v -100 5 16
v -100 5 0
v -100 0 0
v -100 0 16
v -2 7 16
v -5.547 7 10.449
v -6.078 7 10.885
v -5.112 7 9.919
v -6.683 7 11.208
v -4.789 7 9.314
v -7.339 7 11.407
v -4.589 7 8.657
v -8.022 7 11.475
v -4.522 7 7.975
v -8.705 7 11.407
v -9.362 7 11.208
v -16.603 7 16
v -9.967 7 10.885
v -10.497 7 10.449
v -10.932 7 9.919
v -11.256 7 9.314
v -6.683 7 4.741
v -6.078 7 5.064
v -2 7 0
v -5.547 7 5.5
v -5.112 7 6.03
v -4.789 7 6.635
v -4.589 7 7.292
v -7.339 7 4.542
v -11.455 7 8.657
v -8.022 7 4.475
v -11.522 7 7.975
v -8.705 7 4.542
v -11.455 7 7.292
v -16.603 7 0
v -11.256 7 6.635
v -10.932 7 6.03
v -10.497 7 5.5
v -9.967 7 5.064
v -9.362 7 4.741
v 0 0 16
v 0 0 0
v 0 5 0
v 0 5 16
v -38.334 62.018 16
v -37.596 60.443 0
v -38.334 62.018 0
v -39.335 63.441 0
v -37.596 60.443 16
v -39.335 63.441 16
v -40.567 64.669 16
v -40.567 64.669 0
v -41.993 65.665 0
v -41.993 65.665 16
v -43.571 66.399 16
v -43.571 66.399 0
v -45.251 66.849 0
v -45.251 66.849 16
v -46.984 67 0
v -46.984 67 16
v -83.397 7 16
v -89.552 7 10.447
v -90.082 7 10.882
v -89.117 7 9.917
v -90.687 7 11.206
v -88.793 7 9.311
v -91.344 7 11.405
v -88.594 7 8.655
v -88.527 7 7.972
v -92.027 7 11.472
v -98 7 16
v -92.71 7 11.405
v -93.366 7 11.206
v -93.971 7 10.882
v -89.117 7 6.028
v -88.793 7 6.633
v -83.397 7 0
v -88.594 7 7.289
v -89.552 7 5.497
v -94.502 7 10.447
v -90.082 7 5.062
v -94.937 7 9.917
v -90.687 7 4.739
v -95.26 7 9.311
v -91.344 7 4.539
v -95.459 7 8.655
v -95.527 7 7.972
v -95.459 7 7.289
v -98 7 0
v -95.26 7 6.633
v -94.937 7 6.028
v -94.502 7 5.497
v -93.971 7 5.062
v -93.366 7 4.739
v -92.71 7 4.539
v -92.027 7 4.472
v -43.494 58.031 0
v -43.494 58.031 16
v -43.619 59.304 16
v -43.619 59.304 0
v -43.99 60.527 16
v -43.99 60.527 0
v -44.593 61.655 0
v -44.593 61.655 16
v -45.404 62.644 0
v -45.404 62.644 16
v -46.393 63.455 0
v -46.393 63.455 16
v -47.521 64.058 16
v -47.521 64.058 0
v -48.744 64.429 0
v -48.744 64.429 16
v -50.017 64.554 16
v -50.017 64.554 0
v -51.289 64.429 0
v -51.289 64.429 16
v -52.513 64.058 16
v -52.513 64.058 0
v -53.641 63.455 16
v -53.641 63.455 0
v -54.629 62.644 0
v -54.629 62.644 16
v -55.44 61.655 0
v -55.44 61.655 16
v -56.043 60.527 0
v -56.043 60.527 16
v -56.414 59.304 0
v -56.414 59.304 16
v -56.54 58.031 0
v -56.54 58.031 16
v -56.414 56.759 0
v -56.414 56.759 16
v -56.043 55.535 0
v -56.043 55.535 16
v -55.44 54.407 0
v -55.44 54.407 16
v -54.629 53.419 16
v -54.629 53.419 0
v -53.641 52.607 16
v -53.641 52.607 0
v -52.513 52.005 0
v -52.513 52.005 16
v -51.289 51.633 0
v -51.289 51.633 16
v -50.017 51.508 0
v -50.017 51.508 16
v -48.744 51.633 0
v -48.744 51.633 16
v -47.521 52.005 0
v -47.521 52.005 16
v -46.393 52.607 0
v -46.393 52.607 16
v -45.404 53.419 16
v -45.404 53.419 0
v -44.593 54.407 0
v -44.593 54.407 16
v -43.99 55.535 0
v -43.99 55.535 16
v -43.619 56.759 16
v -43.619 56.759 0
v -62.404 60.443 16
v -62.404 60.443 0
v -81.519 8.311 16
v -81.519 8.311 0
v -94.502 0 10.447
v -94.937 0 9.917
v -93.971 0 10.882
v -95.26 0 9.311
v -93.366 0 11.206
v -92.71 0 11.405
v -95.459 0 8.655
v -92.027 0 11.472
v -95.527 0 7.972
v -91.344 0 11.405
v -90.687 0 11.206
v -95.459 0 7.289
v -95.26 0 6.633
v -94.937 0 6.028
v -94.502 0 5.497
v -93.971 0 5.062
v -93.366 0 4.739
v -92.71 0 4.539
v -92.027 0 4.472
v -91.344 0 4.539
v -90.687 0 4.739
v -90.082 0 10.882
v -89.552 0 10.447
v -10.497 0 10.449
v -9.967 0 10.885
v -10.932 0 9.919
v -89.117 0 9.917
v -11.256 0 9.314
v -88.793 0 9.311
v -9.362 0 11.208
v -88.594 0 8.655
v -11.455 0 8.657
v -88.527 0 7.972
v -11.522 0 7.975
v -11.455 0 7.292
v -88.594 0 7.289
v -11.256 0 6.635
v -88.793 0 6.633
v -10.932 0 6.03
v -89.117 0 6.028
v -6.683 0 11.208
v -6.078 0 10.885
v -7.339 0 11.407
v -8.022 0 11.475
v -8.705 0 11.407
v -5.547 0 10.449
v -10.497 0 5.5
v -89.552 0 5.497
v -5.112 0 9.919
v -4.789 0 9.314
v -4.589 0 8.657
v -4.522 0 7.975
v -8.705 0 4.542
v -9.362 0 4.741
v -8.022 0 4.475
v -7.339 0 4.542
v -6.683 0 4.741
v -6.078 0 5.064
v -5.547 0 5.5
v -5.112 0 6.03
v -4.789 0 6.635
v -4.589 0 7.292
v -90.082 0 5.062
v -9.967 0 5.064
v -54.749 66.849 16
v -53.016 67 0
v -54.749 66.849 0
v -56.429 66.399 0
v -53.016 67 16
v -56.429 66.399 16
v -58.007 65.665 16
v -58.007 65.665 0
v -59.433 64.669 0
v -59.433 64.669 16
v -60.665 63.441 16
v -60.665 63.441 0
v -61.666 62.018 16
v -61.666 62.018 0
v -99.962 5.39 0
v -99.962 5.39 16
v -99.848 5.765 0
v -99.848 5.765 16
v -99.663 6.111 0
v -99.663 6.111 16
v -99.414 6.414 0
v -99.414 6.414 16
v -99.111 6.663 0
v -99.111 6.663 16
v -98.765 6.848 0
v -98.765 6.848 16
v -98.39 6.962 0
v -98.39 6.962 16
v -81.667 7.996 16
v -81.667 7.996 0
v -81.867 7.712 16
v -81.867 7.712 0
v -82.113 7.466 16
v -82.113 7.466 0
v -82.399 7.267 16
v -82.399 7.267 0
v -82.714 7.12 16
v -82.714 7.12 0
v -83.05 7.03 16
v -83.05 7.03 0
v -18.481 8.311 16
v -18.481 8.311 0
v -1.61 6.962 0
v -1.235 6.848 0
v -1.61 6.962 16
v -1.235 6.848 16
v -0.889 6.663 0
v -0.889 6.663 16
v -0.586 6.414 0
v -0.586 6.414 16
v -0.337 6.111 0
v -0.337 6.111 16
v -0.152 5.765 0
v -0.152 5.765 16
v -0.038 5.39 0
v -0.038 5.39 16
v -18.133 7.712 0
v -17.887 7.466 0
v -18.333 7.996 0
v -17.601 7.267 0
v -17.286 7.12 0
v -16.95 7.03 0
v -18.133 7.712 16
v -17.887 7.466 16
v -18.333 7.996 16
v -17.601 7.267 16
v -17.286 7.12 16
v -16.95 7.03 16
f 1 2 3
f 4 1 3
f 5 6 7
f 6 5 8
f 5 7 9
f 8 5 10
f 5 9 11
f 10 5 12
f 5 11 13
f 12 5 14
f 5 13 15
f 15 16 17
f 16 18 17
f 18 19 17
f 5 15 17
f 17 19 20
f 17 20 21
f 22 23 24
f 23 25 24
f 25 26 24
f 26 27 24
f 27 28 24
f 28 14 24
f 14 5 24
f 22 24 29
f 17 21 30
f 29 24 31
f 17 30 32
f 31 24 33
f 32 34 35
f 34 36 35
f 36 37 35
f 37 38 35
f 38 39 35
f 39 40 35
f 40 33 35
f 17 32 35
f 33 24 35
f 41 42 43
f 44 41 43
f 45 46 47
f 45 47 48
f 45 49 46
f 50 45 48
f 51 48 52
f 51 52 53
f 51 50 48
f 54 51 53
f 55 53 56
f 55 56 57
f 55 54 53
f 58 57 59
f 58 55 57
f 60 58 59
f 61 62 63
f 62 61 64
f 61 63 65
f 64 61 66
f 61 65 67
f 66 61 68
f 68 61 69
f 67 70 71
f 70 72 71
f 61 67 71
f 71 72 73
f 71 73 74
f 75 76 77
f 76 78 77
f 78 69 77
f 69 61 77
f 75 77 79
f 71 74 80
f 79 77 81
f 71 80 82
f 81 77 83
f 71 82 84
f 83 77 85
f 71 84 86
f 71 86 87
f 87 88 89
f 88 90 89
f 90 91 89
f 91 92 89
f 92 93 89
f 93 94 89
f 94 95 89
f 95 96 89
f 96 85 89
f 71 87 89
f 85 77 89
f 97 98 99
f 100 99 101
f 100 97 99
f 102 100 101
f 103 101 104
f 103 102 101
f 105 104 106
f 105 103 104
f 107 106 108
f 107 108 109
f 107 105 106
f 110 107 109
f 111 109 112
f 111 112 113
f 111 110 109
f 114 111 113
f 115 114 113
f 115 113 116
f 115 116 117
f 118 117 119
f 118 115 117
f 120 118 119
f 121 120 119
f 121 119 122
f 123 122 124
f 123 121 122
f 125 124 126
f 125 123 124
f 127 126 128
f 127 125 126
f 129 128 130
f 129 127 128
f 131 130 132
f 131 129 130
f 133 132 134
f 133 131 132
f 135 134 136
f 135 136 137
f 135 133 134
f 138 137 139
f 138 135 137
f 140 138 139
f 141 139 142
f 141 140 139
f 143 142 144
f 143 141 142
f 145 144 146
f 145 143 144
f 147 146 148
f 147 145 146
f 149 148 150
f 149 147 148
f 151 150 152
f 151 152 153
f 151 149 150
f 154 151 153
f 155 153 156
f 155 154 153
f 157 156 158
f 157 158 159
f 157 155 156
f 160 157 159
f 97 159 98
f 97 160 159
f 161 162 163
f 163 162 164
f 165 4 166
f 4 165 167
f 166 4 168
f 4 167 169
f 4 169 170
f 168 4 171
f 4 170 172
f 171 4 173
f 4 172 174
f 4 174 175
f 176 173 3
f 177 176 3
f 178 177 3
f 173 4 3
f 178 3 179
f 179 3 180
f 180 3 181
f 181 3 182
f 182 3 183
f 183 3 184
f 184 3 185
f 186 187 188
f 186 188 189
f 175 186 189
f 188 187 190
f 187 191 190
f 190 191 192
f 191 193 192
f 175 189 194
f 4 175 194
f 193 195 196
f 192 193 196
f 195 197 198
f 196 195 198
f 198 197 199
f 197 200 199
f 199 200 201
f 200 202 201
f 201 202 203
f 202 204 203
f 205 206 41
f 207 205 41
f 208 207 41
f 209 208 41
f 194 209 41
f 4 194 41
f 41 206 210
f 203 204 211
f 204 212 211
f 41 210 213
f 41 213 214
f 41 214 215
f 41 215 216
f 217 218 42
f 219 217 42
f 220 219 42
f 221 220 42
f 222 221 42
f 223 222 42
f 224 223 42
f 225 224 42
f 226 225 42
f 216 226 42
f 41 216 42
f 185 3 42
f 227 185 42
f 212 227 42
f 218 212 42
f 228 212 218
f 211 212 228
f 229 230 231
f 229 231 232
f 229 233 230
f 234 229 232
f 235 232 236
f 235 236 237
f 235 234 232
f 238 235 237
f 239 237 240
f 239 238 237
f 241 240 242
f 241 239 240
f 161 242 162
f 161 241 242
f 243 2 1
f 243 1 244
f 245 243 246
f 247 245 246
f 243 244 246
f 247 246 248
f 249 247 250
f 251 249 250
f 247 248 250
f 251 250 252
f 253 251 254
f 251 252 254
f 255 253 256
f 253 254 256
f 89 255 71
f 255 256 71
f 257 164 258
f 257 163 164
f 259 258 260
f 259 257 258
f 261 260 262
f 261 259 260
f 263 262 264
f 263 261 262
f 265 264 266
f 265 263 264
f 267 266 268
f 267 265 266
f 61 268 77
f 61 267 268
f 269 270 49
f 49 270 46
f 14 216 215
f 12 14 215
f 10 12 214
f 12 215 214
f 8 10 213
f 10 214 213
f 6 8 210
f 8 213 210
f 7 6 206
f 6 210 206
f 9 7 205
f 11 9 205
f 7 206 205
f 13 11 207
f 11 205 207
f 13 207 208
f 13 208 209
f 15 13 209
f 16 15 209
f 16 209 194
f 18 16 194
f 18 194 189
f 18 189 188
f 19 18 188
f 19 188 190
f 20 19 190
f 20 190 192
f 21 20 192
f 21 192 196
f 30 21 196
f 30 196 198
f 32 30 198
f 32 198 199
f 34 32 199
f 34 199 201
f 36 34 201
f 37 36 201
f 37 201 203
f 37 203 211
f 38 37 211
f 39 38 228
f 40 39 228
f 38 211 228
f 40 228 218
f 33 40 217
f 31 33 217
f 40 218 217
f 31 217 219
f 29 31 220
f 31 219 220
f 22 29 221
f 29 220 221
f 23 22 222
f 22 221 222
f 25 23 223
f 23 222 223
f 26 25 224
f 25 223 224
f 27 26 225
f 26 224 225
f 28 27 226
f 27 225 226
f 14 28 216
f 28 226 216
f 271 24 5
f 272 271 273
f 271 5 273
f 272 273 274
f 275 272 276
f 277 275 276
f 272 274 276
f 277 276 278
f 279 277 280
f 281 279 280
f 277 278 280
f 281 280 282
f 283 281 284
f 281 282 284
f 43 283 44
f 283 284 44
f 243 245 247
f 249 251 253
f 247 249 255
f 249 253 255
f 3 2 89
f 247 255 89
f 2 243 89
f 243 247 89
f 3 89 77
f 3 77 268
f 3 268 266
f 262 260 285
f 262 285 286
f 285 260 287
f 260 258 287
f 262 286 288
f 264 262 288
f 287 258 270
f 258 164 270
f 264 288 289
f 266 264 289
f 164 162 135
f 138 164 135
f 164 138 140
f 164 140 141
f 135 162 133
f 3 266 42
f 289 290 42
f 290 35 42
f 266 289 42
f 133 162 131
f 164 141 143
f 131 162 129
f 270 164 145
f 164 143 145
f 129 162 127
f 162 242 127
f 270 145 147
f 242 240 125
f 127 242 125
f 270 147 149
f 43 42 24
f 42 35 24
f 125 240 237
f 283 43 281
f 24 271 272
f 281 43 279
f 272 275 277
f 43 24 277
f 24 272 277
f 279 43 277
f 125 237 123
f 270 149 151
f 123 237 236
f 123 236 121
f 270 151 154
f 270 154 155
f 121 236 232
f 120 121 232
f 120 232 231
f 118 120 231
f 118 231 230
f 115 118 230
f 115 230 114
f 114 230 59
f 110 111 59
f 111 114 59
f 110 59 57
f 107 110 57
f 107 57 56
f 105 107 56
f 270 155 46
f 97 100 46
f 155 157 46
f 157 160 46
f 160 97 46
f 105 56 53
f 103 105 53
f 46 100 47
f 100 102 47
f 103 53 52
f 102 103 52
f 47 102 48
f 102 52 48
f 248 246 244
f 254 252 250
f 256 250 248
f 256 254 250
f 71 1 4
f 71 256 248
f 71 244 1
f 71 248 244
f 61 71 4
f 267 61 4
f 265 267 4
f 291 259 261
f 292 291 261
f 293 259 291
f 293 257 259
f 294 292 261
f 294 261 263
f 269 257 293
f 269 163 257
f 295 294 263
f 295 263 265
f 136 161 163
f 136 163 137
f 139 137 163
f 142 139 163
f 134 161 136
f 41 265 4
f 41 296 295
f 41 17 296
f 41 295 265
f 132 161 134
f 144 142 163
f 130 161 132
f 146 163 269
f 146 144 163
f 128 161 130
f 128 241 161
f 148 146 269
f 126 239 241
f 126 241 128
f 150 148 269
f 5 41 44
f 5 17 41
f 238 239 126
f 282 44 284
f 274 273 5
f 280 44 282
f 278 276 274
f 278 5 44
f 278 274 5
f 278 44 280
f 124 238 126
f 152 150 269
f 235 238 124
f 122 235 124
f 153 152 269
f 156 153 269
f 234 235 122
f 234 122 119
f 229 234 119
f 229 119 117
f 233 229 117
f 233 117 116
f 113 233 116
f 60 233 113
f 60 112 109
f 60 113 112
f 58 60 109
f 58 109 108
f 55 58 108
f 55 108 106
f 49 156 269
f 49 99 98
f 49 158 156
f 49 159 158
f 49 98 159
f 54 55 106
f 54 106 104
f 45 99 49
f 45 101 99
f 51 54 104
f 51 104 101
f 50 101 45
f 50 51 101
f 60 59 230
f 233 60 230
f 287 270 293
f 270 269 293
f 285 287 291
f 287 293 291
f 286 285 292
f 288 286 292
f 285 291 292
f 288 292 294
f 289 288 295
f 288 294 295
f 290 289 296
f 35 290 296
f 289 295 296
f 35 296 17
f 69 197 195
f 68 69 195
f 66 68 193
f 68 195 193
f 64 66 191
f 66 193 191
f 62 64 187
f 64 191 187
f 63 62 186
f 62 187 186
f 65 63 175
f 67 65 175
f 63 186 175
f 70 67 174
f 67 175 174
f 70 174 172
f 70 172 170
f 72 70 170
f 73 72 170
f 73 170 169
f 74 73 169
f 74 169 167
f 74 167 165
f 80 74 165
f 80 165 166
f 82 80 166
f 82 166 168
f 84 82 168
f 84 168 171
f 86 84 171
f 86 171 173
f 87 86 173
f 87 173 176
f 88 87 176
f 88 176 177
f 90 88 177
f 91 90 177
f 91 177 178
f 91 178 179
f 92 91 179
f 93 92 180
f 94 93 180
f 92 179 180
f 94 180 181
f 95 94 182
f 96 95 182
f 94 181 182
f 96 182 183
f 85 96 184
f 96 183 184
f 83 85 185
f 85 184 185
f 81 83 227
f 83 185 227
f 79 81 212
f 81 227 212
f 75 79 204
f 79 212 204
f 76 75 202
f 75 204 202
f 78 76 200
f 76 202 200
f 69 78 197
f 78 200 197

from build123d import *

# Parameters (mm, degrees)
SKETCH_R       = 6.52296
PAD_DEPTH      = 16
SKETCH001_R    = 3.5
HOLE_DEPTH     = 10
HOLE_TIPS_R    = 3.5
SKETCH002_R    = 3.5
HOLE001_DEPTH  = 8
HOLE001_TIPS_R = 3.5
FILLET_R       = 10
FILLET001_R    = 10
FILLET002_R    = 2
FILLET003_R    = 2
FILLET004_R    = 2
FILLET005_R    = 2


with BuildPart() as part:
    # Sketch → Pad (new body)
    with BuildSketch(Plane.XY):
        Polygon((-100, 0), (0, 0), (0, 7), (-18, 7), (-40, 67), (-60, 67), (-82, 7), (-100, 7), align=None)
        with Locations((-50.016819, 58.031078)):
            Circle(SKETCH_R, mode=Mode.SUBTRACT)
    extrude(amount=PAD_DEPTH)

    # Sketch001 → Hole (cut)
    with BuildSketch(Plane.XZ):
        with Locations((-92.026695, 7.972088)):
            Circle(SKETCH001_R)
    extrude(amount=-HOLE_DEPTH, mode=Mode.SUBTRACT)

    # Hole tips → Hole tip 1 section 0
    with BuildSketch(Plane.XZ.offset(-10), mode=Mode.PRIVATE) as hole_tip_1_s0:
        with Locations((-92.026695, 7.972088)):
            Circle(HOLE_TIPS_R)
    loft([hole_tip_1_s0.sketch, Vertex(-92.026695, 12.103012, 7.972088)], mode=Mode.SUBTRACT)

    # Sketch002 → Hole001 (cut)
    with BuildSketch(Plane.XZ):
        with Locations((-8.022125, 7.974626)):
            Circle(SKETCH002_R)
    extrude(amount=-HOLE001_DEPTH, mode=Mode.SUBTRACT)

    # Hole001 tips → Hole001 tip 1 section 0
    with BuildSketch(Plane.XZ.offset(-8), mode=Mode.PRIVATE) as hole001_tip_1_s0:
        with Locations((-8.022125, 7.974626)):
            Circle(HOLE001_TIPS_R)
    loft([hole001_tip_1_s0.sketch, Vertex(-8.022125, 10.103012, 7.974626)], mode=Mode.SUBTRACT)

    # Fillet
    fillet_edges = [part.edges().sort_by_distance(p)[0] for p in [
        (-40, 67, 8),
    ]]
    fillet(fillet_edges, radius=FILLET_R)

    # Fillet001
    fillet001_edges = [part.edges().sort_by_distance(p)[0] for p in [
        (-60, 67, 8),
    ]]
    fillet(fillet001_edges, radius=FILLET001_R)

    # Fillet002
    fillet002_edges = [part.edges().sort_by_distance(p)[0] for p in [
        (-82, 7, 8),
    ]]
    fillet(fillet002_edges, radius=FILLET002_R)

    # Fillet003
    fillet003_edges = [part.edges().sort_by_distance(p)[0] for p in [
        (-18, 7, 8),
    ]]
    fillet(fillet003_edges, radius=FILLET003_R)

    # Fillet004
    fillet004_edges = [part.edges().sort_by_distance(p)[0] for p in [
        (0, 7, 8),
    ]]
    fillet(fillet004_edges, radius=FILLET004_R)

    # Fillet005
    fillet005_edges = [part.edges().sort_by_distance(p)[0] for p in [
        (-100, 7, 8),
    ]]
    fillet(fillet005_edges, radius=FILLET005_R)


solid = part.part
